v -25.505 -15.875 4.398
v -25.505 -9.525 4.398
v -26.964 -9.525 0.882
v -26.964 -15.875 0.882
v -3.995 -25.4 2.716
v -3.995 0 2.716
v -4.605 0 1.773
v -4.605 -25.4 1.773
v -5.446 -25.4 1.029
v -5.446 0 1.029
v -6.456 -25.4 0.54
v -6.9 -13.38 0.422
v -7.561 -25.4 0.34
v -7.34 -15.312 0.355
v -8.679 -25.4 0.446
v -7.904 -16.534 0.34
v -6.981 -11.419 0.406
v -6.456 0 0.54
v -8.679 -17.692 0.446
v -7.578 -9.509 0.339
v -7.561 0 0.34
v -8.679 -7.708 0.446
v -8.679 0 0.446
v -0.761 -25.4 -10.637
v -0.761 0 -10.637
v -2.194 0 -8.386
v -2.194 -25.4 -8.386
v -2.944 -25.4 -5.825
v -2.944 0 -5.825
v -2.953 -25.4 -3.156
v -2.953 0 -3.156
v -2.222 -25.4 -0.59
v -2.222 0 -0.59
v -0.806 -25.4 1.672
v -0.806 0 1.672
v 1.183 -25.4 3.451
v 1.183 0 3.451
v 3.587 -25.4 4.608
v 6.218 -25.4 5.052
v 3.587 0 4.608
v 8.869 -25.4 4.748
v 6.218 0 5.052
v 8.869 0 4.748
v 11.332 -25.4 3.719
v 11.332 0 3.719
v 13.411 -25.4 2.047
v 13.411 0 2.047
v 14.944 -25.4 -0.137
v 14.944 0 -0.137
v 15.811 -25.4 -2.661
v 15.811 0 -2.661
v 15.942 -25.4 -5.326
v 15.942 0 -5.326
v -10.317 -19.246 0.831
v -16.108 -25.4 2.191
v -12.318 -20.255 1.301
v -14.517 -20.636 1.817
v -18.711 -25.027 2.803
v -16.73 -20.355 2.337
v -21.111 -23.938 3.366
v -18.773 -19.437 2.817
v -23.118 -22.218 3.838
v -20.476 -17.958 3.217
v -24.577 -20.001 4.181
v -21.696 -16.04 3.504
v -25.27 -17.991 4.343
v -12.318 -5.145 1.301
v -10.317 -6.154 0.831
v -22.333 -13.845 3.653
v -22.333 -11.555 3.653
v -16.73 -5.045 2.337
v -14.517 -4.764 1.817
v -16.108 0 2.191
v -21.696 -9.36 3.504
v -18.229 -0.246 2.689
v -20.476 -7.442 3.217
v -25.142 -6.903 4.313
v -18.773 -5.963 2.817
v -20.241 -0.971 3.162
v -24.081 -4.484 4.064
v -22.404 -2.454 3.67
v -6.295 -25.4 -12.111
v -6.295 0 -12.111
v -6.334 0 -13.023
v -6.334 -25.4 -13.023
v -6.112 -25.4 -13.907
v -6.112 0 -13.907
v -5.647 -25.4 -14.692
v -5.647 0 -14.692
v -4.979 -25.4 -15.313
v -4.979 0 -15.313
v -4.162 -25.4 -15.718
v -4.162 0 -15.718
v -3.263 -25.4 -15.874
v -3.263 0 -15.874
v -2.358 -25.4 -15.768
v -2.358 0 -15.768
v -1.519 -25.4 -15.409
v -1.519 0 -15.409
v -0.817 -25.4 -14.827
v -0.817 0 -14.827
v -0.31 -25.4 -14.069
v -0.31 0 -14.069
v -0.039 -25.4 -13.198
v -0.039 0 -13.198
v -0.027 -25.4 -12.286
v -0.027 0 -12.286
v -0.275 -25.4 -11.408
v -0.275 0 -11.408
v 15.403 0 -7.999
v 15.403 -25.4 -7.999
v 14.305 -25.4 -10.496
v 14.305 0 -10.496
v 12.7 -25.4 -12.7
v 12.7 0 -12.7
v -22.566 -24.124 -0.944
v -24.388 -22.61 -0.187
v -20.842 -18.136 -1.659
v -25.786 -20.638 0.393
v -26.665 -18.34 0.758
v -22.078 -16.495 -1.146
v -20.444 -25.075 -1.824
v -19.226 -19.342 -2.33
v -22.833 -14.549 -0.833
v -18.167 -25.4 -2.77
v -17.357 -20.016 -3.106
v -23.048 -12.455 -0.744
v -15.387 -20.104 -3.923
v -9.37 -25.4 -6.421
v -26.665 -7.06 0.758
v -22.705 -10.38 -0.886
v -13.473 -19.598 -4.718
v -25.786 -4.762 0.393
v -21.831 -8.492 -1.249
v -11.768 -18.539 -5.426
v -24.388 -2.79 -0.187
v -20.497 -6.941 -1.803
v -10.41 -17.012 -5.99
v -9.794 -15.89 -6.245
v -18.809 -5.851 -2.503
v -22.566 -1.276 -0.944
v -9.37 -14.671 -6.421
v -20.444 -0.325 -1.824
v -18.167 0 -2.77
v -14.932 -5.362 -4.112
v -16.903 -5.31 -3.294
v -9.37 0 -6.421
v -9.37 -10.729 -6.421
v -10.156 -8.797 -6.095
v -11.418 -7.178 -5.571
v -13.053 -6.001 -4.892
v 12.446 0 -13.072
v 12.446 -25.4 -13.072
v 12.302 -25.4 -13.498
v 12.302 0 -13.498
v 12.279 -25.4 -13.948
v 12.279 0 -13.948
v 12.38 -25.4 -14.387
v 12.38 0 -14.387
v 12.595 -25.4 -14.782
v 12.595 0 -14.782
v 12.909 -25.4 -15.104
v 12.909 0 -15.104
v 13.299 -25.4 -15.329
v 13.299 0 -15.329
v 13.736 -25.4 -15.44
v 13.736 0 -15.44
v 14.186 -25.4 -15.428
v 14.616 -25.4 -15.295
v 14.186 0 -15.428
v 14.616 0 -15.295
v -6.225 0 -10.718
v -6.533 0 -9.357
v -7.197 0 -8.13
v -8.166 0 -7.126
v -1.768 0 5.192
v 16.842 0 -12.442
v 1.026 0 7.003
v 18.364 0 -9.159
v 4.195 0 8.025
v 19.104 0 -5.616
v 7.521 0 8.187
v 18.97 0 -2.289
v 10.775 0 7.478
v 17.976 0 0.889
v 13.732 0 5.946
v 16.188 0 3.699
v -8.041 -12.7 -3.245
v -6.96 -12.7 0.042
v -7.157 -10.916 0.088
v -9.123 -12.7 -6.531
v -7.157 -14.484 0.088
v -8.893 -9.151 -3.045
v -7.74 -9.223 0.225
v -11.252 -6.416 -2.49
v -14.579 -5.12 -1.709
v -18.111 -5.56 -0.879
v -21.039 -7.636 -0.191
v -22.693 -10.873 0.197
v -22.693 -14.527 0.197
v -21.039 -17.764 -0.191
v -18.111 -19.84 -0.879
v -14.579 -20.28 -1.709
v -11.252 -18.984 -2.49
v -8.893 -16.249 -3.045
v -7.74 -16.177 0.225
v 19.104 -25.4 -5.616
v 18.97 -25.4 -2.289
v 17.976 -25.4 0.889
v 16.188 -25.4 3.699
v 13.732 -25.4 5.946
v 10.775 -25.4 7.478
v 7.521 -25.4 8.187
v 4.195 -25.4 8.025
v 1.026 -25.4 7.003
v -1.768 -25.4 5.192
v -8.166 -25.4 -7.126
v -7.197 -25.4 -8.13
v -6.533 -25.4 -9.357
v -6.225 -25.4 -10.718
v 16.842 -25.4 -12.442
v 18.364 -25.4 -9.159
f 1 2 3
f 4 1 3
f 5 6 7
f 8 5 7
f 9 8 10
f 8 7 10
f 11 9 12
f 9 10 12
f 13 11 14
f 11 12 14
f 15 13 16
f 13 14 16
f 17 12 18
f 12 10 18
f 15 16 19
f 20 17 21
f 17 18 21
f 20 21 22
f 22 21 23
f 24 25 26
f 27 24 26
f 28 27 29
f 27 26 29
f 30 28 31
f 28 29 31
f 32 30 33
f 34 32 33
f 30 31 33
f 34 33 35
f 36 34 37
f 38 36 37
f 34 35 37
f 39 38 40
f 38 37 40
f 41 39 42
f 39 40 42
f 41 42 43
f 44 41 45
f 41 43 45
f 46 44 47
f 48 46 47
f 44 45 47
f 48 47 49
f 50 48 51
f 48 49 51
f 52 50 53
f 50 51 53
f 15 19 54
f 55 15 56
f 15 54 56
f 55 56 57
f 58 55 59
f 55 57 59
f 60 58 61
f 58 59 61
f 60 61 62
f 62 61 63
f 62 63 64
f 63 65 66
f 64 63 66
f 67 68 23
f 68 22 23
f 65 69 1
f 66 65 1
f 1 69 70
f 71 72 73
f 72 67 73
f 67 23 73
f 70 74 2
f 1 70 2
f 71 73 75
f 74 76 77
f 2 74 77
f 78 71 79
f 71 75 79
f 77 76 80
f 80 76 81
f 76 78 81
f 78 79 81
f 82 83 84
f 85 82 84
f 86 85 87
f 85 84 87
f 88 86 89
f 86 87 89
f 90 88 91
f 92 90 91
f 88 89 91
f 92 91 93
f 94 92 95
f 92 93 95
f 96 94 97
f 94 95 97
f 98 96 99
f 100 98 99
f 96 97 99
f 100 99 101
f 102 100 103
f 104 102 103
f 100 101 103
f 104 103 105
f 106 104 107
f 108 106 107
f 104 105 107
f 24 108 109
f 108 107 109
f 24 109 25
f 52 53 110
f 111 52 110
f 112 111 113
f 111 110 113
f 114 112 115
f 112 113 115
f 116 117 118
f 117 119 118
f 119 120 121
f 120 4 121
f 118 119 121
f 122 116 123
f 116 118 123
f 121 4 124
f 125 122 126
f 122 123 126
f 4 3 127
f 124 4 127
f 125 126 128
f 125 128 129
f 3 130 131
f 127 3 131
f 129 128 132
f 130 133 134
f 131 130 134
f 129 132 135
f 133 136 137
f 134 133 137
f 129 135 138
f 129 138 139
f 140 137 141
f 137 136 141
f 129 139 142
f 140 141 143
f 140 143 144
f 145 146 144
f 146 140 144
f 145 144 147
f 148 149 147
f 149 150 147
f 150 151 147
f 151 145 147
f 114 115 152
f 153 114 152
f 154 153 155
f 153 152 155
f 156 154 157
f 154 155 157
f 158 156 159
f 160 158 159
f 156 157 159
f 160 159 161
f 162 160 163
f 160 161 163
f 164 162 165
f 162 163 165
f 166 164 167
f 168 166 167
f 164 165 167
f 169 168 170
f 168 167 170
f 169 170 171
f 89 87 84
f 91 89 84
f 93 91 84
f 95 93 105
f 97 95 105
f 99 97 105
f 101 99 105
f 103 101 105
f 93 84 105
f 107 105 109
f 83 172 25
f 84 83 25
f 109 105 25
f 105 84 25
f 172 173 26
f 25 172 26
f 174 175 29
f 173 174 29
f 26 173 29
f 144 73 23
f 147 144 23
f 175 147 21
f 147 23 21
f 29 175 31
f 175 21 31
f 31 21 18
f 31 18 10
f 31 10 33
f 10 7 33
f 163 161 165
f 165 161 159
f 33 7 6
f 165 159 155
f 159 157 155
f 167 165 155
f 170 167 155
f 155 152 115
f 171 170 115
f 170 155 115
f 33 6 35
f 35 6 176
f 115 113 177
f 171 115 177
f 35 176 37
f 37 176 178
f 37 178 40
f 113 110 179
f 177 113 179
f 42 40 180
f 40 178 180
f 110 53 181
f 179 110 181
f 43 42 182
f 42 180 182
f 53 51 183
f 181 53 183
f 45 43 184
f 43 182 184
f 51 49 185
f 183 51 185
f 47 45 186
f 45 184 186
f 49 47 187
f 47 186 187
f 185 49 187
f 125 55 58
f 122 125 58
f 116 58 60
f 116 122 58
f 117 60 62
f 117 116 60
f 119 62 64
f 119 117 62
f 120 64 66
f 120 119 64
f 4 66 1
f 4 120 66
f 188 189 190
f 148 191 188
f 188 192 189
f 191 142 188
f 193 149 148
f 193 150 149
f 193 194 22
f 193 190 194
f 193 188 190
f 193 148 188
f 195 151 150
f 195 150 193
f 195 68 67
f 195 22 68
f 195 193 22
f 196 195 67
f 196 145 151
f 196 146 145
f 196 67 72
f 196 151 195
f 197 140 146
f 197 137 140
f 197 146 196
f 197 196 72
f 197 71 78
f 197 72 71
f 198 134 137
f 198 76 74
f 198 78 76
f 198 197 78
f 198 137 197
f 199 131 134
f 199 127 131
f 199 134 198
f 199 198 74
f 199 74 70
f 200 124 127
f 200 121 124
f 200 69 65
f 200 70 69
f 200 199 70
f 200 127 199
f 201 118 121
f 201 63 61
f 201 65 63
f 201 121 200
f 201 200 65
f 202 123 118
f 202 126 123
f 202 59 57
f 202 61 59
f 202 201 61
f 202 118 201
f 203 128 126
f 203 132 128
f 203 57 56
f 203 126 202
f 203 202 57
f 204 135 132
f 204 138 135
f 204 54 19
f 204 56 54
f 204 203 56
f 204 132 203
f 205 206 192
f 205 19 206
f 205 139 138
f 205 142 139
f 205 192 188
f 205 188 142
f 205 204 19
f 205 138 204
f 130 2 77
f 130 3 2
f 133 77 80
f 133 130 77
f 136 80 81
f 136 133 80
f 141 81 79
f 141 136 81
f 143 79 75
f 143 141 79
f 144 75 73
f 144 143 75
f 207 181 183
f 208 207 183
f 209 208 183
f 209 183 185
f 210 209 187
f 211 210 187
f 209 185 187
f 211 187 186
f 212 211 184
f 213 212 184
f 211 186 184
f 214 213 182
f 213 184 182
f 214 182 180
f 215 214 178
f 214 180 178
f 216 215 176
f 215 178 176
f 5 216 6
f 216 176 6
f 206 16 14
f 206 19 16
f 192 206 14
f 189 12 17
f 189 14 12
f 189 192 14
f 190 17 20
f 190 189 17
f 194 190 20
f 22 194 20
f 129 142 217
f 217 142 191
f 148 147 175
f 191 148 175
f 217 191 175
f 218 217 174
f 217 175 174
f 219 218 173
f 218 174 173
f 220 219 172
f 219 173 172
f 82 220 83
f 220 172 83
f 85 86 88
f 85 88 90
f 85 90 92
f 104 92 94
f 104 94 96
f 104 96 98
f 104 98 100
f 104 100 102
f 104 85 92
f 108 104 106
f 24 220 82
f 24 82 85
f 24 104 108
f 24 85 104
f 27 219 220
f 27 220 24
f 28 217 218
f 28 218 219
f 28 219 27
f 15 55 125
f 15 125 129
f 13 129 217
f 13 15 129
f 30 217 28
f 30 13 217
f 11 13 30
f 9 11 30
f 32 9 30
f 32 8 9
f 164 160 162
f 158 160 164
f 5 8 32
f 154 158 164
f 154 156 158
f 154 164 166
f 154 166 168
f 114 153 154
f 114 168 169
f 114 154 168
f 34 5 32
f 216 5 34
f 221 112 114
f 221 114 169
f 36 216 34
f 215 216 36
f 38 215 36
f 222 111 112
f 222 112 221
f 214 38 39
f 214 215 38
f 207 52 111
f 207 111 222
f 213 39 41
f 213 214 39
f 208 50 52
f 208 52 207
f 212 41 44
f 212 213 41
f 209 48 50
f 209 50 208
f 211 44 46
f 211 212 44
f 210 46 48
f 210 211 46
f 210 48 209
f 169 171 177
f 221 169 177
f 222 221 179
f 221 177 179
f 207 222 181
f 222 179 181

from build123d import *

# Parameters (mm, degrees)
F1_DEPTH      = 25.4
F2_R          = 7.9375
F3_DEPTH      = 25.4
F3_TAPER      = 5
F3_DEPTH_BACK = 25.4
F4_R          = 9.525


with BuildPart() as f1:
    # F0 (on Front) → F1 (new body)
    with BuildSketch(Plane.XZ):
        with BuildLine():
            ThreePointArc((15.9420039577, -5.3261326592), (14.9211079736, -9.2769096997), (12.7, -12.7))
            ThreePointArc((12.7, -12.7), (12.5948783029, -14.7822408301), (14.6158441263, -15.2945635671))
            ThreePointArc((14.6158441263, -15.2945635671), (17.697106564, -10.8437100374), (19.1037159776, -5.6163086455))
            ThreePointArc((19.1037159776, -5.6163086455), (10.77478978, 7.4777303194), (-3.9952923544, 2.7164760977))
            ThreePointArc((-3.9952923544, 2.7164760977), (-5.934088224, 0.7499909222), (-8.6788133112, 0.4458896807))
            Line((-8.6788133112, 0.4458896807), (-25.5047661099, 4.3984803395))
            Line((-25.5047661099, 4.3984803395), (-26.9643777894, 0.8821428277))
            Line((-26.9643777894, 0.8821428277), (-9.3699563909, -6.421201314))
            ThreePointArc((-9.3699563909, -6.421201314), (-6.8229957257, -8.720792311), (-6.2949665087, -12.1114135711))
            ThreePointArc((-6.2949665087, -12.1114135711), (-2.3576029431, -15.767977681), (-0.7614577713, -10.6371284795))
            ThreePointArc((-0.7614577713, -10.6371284795), (3.5871947735, 4.6083370701), (15.9420039577, -5.3261326592))
        make_face()
    extrude(amount=F1_DEPTH)

    # F2 (on face) → F3 (cut, two sides)
    with BuildSketch(Plane(origin=(-0.354609422, 0, -1.5095520662), x_dir=(0.9735003954, 0, -0.22868533), z_dir=(0.22868533, 0, 0.9735003954))) as f3_sk:
        with Locations((-14.7222678204, -12.7)):
            Circle(F2_R)
    extrude(amount=-F3_DEPTH, taper=F3_TAPER, mode=Mode.SUBTRACT)
    extrude(f3_sk.sketch, amount=F3_DEPTH_BACK, mode=Mode.SUBTRACT)

    # F4
    f4_edges = [f1.edges().sort_by_distance(p)[0] for p in [
        (-26.234572, 0, 2.640312),
        (-26.234572, -25.4, 2.640312),
    ]]
    fillet(f4_edges, radius=F4_R)


solid = f1.part
